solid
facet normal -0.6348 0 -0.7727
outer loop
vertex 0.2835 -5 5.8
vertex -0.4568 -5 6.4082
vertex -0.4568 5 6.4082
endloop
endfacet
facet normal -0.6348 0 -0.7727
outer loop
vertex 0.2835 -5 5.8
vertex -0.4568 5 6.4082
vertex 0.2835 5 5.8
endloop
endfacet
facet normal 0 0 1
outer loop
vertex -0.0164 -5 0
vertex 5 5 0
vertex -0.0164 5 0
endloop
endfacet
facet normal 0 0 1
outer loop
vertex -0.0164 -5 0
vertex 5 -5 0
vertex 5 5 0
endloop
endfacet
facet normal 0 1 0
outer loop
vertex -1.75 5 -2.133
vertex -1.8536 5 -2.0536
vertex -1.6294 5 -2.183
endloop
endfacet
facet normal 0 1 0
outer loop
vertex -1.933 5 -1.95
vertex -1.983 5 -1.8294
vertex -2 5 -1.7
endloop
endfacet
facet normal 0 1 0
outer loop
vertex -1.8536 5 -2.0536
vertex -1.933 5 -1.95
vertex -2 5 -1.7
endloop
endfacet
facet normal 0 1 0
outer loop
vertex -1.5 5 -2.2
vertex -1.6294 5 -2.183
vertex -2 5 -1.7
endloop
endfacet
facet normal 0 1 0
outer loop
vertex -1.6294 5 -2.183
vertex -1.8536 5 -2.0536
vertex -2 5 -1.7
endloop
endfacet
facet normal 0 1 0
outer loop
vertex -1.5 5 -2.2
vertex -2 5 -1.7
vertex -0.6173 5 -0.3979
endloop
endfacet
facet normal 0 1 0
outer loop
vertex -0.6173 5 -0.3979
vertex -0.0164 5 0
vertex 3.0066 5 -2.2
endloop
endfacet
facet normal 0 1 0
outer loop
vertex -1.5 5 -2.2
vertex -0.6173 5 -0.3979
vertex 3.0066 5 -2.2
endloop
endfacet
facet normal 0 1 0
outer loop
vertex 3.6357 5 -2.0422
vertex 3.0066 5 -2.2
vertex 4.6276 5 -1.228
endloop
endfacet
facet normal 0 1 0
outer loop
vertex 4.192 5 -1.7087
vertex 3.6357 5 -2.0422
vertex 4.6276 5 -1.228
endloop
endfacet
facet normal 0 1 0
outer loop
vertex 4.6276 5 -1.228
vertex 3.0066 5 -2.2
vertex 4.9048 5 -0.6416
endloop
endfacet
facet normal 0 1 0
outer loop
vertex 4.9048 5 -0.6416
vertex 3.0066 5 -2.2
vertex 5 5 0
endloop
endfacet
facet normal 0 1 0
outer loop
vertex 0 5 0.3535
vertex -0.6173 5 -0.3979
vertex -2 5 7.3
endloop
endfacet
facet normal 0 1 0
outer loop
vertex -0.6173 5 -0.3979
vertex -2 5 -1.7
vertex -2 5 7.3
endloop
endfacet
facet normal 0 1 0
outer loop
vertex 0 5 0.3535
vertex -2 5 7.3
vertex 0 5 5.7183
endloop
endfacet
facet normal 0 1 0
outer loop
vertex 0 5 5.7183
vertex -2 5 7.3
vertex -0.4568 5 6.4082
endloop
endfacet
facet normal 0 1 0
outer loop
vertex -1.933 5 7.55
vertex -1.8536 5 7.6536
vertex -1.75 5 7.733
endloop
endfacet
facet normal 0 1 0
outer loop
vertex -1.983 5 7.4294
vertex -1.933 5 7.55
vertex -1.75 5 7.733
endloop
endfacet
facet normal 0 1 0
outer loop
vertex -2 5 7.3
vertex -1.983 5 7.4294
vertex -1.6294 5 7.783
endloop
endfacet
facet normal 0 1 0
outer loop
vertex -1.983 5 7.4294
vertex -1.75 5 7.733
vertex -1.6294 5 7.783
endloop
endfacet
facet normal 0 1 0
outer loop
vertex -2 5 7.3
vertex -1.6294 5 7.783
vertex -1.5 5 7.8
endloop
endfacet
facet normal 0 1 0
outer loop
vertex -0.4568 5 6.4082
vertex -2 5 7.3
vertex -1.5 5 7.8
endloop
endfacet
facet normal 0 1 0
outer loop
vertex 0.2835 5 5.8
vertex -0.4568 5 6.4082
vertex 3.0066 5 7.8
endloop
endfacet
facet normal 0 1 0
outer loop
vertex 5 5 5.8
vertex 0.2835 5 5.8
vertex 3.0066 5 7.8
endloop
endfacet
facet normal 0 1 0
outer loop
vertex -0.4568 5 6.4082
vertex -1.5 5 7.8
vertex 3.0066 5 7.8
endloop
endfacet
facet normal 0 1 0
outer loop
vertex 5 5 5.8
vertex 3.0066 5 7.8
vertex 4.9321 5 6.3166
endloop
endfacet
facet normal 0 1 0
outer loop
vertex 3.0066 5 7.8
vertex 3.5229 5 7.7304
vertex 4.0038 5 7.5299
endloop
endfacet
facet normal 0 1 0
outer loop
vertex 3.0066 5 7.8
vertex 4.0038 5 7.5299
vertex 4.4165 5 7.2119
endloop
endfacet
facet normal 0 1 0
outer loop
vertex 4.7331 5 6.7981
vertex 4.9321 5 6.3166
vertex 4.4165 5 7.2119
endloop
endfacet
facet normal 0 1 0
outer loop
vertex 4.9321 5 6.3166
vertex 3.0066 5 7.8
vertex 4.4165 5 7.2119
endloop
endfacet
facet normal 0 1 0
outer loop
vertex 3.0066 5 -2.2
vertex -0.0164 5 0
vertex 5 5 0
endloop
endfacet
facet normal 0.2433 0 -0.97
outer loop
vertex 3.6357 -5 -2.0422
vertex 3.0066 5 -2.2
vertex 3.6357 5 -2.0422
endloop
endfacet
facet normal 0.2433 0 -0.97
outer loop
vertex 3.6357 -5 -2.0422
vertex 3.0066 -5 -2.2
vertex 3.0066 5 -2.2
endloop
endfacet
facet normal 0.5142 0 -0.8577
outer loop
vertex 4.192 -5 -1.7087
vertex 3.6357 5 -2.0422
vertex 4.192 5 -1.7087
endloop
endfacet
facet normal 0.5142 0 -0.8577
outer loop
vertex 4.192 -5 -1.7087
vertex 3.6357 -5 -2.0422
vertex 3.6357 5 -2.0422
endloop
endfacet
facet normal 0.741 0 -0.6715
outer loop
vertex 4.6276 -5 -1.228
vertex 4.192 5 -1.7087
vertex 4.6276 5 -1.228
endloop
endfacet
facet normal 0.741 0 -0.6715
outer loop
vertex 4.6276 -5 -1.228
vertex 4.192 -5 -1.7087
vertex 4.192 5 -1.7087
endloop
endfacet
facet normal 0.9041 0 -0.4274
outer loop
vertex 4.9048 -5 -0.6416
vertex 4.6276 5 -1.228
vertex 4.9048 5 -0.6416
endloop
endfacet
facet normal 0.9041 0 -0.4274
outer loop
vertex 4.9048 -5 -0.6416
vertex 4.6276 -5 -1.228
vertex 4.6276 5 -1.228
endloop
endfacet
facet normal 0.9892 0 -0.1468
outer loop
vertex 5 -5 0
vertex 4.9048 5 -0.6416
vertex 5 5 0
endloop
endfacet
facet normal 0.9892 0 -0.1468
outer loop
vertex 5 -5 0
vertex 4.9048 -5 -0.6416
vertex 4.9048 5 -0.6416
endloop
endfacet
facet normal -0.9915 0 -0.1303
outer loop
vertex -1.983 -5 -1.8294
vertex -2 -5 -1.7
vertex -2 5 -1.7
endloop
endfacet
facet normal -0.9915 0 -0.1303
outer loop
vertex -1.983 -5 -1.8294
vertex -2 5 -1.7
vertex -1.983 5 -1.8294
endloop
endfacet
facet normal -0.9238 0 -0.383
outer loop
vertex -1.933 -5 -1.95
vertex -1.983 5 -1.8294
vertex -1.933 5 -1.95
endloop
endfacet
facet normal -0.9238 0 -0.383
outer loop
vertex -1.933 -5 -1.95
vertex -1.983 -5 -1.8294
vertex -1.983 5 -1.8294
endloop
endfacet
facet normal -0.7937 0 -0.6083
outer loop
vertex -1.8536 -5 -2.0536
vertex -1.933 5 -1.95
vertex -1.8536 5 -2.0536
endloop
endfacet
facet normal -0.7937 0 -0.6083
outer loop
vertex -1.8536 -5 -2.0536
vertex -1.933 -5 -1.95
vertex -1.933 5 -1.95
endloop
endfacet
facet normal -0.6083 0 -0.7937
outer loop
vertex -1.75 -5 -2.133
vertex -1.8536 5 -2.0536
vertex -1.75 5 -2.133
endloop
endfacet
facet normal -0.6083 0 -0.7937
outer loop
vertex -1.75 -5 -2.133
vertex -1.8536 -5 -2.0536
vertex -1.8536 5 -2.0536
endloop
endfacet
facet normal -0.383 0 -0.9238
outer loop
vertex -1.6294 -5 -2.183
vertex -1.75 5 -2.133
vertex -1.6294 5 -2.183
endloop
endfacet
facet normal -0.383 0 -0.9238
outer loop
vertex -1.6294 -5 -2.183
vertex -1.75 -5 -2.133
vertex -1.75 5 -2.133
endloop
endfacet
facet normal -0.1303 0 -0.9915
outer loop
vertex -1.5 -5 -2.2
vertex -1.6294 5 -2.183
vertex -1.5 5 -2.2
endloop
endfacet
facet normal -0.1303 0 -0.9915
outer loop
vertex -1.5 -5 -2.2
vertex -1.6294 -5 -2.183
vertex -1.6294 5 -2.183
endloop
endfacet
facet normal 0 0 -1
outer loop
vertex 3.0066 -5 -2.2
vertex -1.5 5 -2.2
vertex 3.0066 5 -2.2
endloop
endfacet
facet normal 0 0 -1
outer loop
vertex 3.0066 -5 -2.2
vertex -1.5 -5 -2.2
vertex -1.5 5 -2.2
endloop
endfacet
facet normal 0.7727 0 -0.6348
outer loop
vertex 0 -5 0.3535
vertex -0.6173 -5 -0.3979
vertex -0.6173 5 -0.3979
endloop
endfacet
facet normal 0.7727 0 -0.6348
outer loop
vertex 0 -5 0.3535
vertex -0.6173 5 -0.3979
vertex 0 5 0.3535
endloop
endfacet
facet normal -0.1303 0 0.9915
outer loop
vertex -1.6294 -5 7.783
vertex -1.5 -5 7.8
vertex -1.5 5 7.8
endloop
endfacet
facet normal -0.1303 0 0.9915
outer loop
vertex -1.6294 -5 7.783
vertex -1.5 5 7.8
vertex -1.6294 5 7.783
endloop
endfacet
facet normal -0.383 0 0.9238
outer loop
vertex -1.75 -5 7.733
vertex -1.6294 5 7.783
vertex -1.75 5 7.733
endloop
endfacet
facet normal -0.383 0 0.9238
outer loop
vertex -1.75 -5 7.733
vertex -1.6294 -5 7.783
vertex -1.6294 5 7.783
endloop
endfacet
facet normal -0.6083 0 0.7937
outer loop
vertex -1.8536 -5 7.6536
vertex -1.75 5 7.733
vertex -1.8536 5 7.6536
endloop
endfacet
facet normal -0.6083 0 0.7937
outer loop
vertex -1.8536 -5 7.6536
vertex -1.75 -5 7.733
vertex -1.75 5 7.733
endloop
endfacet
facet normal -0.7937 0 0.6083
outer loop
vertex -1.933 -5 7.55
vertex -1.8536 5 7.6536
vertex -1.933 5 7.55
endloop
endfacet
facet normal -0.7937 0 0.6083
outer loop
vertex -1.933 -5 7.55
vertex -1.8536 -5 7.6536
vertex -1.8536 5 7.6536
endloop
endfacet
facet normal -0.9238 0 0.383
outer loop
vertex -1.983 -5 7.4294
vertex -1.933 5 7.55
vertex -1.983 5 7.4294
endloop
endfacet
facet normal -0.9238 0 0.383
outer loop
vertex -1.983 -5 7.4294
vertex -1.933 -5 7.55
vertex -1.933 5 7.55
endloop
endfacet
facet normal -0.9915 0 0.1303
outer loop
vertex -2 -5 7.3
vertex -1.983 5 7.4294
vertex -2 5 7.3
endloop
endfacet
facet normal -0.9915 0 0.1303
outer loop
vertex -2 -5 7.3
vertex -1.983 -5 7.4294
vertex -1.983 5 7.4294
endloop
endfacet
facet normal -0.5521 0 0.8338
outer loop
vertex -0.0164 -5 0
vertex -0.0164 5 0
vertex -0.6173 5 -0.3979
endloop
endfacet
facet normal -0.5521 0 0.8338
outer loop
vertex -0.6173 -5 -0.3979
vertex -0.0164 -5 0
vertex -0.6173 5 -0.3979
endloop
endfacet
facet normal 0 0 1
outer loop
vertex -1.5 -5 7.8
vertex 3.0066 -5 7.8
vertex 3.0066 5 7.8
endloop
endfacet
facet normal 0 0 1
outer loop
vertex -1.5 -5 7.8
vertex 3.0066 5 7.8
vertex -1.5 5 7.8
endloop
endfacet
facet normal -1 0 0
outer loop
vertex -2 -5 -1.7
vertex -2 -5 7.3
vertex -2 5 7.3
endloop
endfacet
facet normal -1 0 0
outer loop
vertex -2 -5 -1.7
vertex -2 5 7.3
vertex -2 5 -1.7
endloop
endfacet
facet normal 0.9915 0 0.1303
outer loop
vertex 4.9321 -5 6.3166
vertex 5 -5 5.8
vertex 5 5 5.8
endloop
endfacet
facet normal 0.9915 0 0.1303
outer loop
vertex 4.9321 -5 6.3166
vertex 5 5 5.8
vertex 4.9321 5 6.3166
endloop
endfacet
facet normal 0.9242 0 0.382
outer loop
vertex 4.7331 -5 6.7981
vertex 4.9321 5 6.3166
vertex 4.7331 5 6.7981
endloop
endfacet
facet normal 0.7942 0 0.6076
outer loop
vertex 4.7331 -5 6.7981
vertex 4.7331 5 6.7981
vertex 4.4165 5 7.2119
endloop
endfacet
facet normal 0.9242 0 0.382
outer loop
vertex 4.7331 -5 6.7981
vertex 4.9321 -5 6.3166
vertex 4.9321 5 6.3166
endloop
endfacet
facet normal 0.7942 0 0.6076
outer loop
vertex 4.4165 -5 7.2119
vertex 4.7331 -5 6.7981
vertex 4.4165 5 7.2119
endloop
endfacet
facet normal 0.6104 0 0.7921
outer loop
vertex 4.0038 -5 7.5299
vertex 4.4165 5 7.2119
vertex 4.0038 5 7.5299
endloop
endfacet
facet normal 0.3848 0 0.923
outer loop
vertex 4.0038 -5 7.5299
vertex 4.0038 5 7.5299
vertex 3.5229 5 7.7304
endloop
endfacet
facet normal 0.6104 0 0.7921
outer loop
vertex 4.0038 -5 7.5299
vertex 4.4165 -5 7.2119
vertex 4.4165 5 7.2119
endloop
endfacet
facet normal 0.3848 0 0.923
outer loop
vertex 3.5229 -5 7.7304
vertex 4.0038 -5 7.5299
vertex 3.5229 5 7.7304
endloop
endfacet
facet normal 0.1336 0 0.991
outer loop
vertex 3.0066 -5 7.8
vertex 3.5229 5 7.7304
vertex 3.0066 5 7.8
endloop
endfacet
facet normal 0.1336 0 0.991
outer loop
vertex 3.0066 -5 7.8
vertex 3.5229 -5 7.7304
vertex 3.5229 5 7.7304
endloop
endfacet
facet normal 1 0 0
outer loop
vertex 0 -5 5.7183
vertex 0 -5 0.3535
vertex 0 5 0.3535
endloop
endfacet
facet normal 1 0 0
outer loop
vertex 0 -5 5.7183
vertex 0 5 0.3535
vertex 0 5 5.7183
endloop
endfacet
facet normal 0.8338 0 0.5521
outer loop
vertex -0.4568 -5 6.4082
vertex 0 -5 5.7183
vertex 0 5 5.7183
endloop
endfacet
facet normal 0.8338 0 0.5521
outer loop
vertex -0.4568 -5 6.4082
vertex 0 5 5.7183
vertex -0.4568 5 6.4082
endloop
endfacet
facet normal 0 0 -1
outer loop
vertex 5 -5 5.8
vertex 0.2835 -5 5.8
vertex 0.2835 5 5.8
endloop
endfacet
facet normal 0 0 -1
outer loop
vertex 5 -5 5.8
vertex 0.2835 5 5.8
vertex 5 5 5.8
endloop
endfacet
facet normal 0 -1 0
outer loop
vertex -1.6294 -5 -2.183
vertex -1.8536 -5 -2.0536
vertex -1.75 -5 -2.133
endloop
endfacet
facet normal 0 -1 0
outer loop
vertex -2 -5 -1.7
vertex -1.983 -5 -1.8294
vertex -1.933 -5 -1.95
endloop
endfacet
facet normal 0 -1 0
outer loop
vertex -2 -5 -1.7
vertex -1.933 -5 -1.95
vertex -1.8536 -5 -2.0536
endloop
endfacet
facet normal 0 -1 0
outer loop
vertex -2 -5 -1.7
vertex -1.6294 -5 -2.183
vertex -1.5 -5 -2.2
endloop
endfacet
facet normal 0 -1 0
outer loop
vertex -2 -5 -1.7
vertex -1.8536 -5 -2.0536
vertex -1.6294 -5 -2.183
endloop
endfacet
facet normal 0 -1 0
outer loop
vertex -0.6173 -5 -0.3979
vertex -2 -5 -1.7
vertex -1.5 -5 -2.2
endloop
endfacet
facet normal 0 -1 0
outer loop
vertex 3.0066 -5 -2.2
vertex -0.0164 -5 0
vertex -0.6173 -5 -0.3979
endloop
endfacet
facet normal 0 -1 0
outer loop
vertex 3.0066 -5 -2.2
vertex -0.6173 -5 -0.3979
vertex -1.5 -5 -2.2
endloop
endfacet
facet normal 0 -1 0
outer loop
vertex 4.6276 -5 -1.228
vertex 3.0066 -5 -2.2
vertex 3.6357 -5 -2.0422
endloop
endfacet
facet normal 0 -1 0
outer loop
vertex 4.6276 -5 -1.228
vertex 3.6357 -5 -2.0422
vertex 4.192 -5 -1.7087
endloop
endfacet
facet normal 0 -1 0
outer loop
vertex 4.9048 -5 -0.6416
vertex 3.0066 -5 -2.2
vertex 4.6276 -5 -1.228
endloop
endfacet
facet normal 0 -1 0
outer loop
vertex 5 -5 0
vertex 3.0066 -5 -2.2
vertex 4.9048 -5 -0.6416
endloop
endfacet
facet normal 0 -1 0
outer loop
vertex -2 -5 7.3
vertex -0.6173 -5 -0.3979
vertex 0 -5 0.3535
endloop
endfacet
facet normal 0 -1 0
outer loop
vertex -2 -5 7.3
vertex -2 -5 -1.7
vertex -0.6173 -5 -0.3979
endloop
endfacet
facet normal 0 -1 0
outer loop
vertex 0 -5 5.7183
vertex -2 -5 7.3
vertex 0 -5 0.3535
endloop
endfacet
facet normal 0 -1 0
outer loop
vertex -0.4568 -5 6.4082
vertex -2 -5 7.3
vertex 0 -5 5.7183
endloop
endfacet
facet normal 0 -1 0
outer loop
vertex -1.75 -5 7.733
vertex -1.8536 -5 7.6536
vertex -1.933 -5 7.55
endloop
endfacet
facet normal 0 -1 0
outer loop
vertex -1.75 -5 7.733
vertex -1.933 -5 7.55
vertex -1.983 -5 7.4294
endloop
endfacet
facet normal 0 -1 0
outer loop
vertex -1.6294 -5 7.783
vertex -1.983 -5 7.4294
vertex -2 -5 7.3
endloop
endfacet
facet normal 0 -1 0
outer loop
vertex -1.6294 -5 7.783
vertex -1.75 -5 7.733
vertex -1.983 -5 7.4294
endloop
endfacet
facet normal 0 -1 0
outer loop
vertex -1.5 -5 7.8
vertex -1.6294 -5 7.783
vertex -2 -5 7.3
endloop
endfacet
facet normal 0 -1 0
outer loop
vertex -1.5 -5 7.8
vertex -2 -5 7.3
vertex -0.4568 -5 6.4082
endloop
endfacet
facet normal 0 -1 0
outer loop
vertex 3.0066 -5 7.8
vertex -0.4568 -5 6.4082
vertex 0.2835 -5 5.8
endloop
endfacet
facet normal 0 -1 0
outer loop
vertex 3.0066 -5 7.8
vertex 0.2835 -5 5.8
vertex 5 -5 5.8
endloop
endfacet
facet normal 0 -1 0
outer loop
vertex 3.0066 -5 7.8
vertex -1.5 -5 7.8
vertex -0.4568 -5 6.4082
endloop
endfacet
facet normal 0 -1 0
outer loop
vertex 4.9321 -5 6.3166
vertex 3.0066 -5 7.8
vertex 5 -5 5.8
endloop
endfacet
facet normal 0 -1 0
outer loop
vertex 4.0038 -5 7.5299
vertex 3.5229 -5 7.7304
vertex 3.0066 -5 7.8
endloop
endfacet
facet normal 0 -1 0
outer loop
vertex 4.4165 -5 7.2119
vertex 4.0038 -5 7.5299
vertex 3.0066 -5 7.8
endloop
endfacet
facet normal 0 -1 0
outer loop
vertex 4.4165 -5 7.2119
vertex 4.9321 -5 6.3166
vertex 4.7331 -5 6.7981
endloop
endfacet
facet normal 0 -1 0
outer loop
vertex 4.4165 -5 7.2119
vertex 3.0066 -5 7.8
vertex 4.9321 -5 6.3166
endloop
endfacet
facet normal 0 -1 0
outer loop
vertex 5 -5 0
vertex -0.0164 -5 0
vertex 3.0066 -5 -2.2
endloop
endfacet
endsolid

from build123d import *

# Parameters (mm, degrees)
F1_DEPTH = 5


with BuildPart() as f1:
    # F0 (on Front) → F1 (new body, symmetric)
    with BuildSketch(Plane.XZ):
        with BuildLine():
            Line((5, 0), (0, 0))
            Line((0, 0), (-0.016378, 0))
            Line((-0.016378, 0), (-0.617307, -0.397922))
            Line((-0.617307, -0.397922), (0, 0.353466))
            Line((0, 0.353466), (0, 5.71834))
            Line((0, 5.71834), (-0.456822, 6.408219))
            Line((-0.456822, 6.408219), (0.283503, 5.8))
            Line((0.283503, 5.8), (5, 5.8))
            ThreePointArc((5, 5.8), (4.416528, 7.2119), (3.00655, 7.8))
            Line((3.00655, 7.8), (-1.5, 7.8))
            ThreePointArc((-1.5, 7.8), (-1.853553, 7.653553), (-2, 7.3))
            Line((-2, 7.3), (-2, -1.7))
            ThreePointArc((-2, -1.7), (-1.853553, -2.053553), (-1.5, -2.2))
            Line((-1.5, -2.2), (3.00655, -2.2))
            ThreePointArc((3.00655, -2.2), (4.427511, -1.484406), (5, 0))
        make_face()
    extrude(amount=F1_DEPTH, both=True)


solid = f1.part
